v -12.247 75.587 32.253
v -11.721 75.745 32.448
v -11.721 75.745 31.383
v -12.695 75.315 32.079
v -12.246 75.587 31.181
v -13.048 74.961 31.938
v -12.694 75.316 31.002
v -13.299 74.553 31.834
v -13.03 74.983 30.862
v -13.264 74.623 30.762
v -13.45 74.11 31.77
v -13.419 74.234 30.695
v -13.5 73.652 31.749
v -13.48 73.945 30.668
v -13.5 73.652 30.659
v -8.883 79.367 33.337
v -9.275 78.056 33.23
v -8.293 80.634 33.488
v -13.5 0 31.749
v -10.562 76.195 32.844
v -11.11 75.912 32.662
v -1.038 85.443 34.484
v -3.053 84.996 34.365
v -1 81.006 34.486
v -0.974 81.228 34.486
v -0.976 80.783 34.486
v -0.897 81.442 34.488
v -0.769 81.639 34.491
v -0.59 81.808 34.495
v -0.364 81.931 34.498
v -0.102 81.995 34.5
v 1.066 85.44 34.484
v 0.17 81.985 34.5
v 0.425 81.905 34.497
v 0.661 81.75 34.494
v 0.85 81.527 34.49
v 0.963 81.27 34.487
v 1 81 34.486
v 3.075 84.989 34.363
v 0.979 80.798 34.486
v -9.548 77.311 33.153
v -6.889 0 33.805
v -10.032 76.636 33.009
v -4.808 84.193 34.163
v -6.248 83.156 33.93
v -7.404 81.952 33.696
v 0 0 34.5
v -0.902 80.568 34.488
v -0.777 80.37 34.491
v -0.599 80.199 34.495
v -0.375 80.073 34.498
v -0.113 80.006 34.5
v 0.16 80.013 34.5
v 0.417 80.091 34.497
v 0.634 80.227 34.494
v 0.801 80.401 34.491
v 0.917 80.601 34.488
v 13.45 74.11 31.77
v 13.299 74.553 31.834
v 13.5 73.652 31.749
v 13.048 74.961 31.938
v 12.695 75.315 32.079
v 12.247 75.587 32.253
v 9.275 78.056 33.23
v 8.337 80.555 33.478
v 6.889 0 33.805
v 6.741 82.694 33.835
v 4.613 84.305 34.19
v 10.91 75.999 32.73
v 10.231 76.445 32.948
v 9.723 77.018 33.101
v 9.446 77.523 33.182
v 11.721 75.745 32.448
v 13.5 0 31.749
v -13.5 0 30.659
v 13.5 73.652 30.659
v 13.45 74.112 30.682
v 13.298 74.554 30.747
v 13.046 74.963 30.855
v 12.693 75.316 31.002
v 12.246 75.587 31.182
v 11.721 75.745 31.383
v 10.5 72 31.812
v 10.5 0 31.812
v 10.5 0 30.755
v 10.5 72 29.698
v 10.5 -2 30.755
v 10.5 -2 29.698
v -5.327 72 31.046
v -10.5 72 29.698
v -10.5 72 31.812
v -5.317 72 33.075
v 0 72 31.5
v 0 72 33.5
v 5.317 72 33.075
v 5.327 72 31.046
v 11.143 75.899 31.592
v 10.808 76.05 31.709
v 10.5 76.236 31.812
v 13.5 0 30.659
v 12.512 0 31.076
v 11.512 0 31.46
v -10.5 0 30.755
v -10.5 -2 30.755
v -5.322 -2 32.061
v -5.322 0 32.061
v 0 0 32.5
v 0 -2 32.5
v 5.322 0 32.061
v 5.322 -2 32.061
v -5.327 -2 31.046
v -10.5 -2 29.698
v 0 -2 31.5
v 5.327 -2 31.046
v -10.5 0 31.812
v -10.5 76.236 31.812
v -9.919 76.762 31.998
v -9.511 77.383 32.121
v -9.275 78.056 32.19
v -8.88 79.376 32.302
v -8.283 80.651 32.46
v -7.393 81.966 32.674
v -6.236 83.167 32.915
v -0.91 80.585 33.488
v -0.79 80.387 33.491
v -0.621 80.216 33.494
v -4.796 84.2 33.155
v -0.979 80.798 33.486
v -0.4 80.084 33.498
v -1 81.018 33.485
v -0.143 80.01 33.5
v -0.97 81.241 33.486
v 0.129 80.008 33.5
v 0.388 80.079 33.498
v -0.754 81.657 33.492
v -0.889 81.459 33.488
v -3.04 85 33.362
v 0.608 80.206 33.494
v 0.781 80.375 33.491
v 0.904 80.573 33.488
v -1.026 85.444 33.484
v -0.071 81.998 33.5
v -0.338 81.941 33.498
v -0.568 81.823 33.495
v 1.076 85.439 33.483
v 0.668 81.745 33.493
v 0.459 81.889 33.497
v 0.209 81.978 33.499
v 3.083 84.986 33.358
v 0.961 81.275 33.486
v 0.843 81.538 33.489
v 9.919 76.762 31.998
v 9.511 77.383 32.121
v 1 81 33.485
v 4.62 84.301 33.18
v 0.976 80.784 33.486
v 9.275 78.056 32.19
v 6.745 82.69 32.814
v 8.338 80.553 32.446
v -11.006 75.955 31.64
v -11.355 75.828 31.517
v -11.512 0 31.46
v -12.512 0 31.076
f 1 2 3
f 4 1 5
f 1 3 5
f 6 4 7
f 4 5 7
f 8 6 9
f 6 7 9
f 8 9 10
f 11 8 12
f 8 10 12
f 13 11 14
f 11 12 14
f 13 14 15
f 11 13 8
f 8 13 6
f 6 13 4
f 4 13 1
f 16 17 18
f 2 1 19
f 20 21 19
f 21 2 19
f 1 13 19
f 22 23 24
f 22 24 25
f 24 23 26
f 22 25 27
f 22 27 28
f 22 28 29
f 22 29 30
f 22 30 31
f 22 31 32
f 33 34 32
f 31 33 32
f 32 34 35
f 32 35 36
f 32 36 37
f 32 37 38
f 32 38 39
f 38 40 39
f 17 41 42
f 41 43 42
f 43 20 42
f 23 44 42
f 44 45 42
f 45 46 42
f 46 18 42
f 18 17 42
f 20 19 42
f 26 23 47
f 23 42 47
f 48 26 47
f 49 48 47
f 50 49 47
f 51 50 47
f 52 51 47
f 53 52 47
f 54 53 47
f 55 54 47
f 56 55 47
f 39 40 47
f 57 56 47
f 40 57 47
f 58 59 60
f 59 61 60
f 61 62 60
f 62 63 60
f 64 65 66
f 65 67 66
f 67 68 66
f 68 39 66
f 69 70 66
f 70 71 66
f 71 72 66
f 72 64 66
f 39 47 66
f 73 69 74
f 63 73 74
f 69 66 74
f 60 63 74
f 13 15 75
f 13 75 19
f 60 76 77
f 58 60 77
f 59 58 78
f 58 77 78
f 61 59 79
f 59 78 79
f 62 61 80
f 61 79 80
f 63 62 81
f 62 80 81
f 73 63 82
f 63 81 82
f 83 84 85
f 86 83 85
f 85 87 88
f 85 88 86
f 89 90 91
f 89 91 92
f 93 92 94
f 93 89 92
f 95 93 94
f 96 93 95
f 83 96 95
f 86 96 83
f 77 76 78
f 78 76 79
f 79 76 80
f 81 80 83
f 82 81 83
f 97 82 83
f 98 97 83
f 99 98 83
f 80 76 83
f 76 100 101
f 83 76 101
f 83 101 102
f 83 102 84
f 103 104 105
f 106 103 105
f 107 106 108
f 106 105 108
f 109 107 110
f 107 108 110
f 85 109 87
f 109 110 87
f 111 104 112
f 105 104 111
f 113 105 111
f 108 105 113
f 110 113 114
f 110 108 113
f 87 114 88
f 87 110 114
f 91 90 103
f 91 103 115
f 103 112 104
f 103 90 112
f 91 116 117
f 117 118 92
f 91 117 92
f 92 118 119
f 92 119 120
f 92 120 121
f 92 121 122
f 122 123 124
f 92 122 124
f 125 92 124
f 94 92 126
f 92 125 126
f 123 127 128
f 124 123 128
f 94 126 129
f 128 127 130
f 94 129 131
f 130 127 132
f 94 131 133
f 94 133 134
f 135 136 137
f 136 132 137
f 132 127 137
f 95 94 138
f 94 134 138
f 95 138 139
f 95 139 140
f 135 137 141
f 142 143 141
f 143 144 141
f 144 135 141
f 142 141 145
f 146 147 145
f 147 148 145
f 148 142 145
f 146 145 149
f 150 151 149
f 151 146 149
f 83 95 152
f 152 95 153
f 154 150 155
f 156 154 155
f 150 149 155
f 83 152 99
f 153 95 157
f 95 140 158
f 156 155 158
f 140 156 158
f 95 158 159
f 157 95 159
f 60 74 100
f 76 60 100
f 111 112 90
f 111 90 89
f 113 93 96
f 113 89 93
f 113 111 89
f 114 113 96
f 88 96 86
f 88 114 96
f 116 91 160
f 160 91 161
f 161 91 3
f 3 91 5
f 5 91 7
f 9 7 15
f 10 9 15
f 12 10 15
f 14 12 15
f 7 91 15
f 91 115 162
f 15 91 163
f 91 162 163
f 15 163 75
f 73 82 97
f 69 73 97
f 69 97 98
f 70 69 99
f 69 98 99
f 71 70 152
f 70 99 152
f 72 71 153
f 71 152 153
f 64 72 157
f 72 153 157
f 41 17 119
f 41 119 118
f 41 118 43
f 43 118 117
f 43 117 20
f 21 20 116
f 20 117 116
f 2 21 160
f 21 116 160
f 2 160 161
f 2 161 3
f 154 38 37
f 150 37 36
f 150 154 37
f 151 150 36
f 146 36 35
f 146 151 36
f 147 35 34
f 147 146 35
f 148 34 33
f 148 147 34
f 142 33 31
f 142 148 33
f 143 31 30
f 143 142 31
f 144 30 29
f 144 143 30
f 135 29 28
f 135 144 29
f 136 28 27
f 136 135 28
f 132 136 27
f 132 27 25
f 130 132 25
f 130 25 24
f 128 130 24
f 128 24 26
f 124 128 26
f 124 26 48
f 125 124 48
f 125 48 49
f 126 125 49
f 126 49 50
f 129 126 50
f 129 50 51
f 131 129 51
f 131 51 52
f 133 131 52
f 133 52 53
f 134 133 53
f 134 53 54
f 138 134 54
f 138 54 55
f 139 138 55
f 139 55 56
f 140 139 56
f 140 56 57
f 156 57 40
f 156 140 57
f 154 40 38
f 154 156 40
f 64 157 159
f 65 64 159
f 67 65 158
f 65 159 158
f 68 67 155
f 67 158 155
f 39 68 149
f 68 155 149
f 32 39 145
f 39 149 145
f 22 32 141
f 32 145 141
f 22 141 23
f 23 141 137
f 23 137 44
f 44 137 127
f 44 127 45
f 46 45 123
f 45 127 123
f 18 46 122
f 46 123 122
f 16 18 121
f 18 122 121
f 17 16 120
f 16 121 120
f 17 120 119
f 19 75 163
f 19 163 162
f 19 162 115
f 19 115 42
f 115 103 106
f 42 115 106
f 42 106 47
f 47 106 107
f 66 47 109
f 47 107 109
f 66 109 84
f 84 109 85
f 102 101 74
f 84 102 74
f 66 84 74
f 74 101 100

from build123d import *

# Parameters (mm, degrees)
EXTRUDE_1_DEPTH          = 76
EXTRUDE_2_DEPTH          = 2
EXTRUDE_2_DEPTH_BACK     = 76
EXTRUDE_3_DEPTH          = 9.5
CUT_EXTRUDE_1_DEPTH      = 78.5
CUT_EXTRUDE_2_DEPTH      = 4
CUT_EXTRUDE_2_DEPTH_BACK = 78.5
SKETCH_8_R               = 1
CUT_EXTRUDE_3_DEPTH      = 46.5
CUT_EXTRUDE_4_DEPTH      = 2


with BuildPart() as part:
    # Эскиз1 → Бобышка-Вытянуть1 (new body)
    with BuildSketch(Plane(origin=(0, 0, 0), x_dir=(1, 0, 0), z_dir=(0, 1, 0))):
        with BuildLine():
            Line((-13.5, -30.659419434), (-13.5, -31.749015733))
            ThreePointArc((-13.5, -31.749015733), (0, -34.5), (13.5, -31.749015733))
            Line((13.5, -31.749015733), (13.5, -30.659419434))
            ThreePointArc((13.5, -30.659419434), (12.013828707, -31.271679197), (10.5, -31.811947441))
            Line((10.5, -31.811947441), (10.5, -30.757112998))
            ThreePointArc((10.5, -30.757112998), (0, -32.5), (-10.5, -30.757112998))
            Line((-10.5, -30.757112998), (-10.5, -31.811947441))
            ThreePointArc((-10.5, -31.811947441), (-12.013828707, -31.271679197), (-13.5, -30.659419434))
        make_face()
    extrude(amount=EXTRUDE_1_DEPTH)

    # Эскиз2 → Бобышка-Вытянуть2 (add, two sides)
    with BuildSketch(Plane.XZ) as extrude_2_sk:
        with BuildLine():
            Line((-10.5, 31.811947441), (-10.5, 30.757112998))
            Line((-10.5, 30.757112998), (-10.5, 29.69848481))
            ThreePointArc((-10.5, 29.69848481), (0, 31.5), (10.5, 29.69848481))
            Line((10.5, 29.69848481), (10.5, 30.757112998))
            Line((10.5, 30.757112998), (10.5, 31.811947441))
            ThreePointArc((10.5, 31.811947441), (0, 33.5), (-10.5, 31.811947441))
        make_face()
    extrude(amount=EXTRUDE_2_DEPTH)
    extrude(extrude_2_sk.sketch, amount=-EXTRUDE_2_DEPTH_BACK)

    # Эскиз6 → Бобышка-Вытянуть3 (add)
    with BuildSketch(Plane(origin=(0, 76, 0), x_dir=(1, 0, 0), z_dir=(0, 1, 0))):
        with BuildLine():
            Line((-10.5, -30.757112998), (-10.5, -31.811947441))
            ThreePointArc((-10.5, -31.811947441), (-12.013828707, -31.271679197), (-13.5, -30.659419434))
            Line((-13.5, -30.659419434), (-13.5, -31.749015733))
            ThreePointArc((-13.5, -31.749015733), (0, -34.5), (13.5, -31.749015733))
            Line((13.5, -31.749015733), (13.5, -30.659419434))
            ThreePointArc((13.5, -30.659419434), (12.013828707, -31.271679197), (10.5, -31.811947441))
            Line((10.5, -31.811947441), (10.5, -30.757112998))
            ThreePointArc((10.5, -30.757112998), (0, -32.5), (-10.5, -30.757112998))
        make_face()
    extrude(amount=EXTRUDE_3_DEPTH)

    # Эскиз3 → Вырез-Вытянуть1 (cut)
    with BuildSketch(Plane.XY):
        with BuildLine():
            Line((-29.777002316, 76), (-29.777002316, 102.252406504))
            Line((-29.777002316, 102.252406504), (31.597845716, 102.252406504))
            Line((31.597845716, 102.252406504), (31.597845716, 75.705478865))
            Line((31.597845716, 75.705478865), (31.597845716, 73.652327708))
            Line((31.597845716, 73.652327708), (13.5, 73.652327708))
            ThreePointArc((13.5, 73.652327708), (12.995178699, 75.025430995), (11.721154976, 75.744542067))
            ThreePointArc((11.721154976, 75.744542067), (10.143272785, 76.524968738), (9.274814815, 78.056163941))
            ThreePointArc((9.274814815, 78.056163941), (0, 85.5), (-9.274814815, 78.056163941))
            ThreePointArc((-9.274814815, 78.056163941), (-10.143272784, 76.52496874), (-11.721154974, 75.744542071))
            ThreePointArc((-11.721154974, 75.744542071), (-12.995178698, 75.025430999), (-13.5, 73.652327712))
            Line((-13.5, 73.652327712), (-29.777002316, 73.652327712))
            Line((-29.777002316, 73.652327712), (-29.777002316, 76))
        make_face()
    extrude(amount=CUT_EXTRUDE_1_DEPTH, mode=Mode.SUBTRACT)

    # Эскиз7 → Вырез-Вытянуть2 (cut, two sides)
    with BuildSketch(Plane(origin=(0, 76, 0), x_dir=(-1, 0, 0), z_dir=(0, -1, 0))) as cut_extrude_2_sk:
        with BuildLine():
            Line((10.5, -29.69848481), (10.5, -31.811947441))
            ThreePointArc((10.5, -31.811947441), (0, -33.499999909), (-10.5, -31.811947441))
            Line((-10.5, -31.811947441), (-10.5, -29.69848481))
            ThreePointArc((-10.5, -29.69848481), (0, -31.5), (10.5, -29.69848481))
        make_face()
    extrude(amount=CUT_EXTRUDE_2_DEPTH, mode=Mode.SUBTRACT)
    extrude(cut_extrude_2_sk.sketch, amount=-CUT_EXTRUDE_2_DEPTH_BACK, mode=Mode.SUBTRACT)

    # Эскиз8 → Вырез-Вытянуть3 (cut)
    with BuildSketch(Plane.XY):
        with Locations((0, 81)):
            Circle(SKETCH_8_R)
    extrude(amount=CUT_EXTRUDE_3_DEPTH, mode=Mode.SUBTRACT)

    # Эскиз9 → Вырез-Вытянуть4 (cut)
    with BuildSketch(Plane.XZ.offset(2)):
        with BuildLine():
            Line((-10.5, 31.811947426), (-10.5, 30.755216126))
            ThreePointArc((-10.5, 30.755216126), (0, 32.500000073), (10.5, 30.755216126))
            Line((10.5, 30.755216126), (10.5, 31.811947441))
            ThreePointArc((10.5, 31.811947441), (-1e-09, 33.499999996), (-10.5, 31.811947426))
        make_face()
    extrude(amount=-CUT_EXTRUDE_4_DEPTH, mode=Mode.SUBTRACT)


solid = part.part
